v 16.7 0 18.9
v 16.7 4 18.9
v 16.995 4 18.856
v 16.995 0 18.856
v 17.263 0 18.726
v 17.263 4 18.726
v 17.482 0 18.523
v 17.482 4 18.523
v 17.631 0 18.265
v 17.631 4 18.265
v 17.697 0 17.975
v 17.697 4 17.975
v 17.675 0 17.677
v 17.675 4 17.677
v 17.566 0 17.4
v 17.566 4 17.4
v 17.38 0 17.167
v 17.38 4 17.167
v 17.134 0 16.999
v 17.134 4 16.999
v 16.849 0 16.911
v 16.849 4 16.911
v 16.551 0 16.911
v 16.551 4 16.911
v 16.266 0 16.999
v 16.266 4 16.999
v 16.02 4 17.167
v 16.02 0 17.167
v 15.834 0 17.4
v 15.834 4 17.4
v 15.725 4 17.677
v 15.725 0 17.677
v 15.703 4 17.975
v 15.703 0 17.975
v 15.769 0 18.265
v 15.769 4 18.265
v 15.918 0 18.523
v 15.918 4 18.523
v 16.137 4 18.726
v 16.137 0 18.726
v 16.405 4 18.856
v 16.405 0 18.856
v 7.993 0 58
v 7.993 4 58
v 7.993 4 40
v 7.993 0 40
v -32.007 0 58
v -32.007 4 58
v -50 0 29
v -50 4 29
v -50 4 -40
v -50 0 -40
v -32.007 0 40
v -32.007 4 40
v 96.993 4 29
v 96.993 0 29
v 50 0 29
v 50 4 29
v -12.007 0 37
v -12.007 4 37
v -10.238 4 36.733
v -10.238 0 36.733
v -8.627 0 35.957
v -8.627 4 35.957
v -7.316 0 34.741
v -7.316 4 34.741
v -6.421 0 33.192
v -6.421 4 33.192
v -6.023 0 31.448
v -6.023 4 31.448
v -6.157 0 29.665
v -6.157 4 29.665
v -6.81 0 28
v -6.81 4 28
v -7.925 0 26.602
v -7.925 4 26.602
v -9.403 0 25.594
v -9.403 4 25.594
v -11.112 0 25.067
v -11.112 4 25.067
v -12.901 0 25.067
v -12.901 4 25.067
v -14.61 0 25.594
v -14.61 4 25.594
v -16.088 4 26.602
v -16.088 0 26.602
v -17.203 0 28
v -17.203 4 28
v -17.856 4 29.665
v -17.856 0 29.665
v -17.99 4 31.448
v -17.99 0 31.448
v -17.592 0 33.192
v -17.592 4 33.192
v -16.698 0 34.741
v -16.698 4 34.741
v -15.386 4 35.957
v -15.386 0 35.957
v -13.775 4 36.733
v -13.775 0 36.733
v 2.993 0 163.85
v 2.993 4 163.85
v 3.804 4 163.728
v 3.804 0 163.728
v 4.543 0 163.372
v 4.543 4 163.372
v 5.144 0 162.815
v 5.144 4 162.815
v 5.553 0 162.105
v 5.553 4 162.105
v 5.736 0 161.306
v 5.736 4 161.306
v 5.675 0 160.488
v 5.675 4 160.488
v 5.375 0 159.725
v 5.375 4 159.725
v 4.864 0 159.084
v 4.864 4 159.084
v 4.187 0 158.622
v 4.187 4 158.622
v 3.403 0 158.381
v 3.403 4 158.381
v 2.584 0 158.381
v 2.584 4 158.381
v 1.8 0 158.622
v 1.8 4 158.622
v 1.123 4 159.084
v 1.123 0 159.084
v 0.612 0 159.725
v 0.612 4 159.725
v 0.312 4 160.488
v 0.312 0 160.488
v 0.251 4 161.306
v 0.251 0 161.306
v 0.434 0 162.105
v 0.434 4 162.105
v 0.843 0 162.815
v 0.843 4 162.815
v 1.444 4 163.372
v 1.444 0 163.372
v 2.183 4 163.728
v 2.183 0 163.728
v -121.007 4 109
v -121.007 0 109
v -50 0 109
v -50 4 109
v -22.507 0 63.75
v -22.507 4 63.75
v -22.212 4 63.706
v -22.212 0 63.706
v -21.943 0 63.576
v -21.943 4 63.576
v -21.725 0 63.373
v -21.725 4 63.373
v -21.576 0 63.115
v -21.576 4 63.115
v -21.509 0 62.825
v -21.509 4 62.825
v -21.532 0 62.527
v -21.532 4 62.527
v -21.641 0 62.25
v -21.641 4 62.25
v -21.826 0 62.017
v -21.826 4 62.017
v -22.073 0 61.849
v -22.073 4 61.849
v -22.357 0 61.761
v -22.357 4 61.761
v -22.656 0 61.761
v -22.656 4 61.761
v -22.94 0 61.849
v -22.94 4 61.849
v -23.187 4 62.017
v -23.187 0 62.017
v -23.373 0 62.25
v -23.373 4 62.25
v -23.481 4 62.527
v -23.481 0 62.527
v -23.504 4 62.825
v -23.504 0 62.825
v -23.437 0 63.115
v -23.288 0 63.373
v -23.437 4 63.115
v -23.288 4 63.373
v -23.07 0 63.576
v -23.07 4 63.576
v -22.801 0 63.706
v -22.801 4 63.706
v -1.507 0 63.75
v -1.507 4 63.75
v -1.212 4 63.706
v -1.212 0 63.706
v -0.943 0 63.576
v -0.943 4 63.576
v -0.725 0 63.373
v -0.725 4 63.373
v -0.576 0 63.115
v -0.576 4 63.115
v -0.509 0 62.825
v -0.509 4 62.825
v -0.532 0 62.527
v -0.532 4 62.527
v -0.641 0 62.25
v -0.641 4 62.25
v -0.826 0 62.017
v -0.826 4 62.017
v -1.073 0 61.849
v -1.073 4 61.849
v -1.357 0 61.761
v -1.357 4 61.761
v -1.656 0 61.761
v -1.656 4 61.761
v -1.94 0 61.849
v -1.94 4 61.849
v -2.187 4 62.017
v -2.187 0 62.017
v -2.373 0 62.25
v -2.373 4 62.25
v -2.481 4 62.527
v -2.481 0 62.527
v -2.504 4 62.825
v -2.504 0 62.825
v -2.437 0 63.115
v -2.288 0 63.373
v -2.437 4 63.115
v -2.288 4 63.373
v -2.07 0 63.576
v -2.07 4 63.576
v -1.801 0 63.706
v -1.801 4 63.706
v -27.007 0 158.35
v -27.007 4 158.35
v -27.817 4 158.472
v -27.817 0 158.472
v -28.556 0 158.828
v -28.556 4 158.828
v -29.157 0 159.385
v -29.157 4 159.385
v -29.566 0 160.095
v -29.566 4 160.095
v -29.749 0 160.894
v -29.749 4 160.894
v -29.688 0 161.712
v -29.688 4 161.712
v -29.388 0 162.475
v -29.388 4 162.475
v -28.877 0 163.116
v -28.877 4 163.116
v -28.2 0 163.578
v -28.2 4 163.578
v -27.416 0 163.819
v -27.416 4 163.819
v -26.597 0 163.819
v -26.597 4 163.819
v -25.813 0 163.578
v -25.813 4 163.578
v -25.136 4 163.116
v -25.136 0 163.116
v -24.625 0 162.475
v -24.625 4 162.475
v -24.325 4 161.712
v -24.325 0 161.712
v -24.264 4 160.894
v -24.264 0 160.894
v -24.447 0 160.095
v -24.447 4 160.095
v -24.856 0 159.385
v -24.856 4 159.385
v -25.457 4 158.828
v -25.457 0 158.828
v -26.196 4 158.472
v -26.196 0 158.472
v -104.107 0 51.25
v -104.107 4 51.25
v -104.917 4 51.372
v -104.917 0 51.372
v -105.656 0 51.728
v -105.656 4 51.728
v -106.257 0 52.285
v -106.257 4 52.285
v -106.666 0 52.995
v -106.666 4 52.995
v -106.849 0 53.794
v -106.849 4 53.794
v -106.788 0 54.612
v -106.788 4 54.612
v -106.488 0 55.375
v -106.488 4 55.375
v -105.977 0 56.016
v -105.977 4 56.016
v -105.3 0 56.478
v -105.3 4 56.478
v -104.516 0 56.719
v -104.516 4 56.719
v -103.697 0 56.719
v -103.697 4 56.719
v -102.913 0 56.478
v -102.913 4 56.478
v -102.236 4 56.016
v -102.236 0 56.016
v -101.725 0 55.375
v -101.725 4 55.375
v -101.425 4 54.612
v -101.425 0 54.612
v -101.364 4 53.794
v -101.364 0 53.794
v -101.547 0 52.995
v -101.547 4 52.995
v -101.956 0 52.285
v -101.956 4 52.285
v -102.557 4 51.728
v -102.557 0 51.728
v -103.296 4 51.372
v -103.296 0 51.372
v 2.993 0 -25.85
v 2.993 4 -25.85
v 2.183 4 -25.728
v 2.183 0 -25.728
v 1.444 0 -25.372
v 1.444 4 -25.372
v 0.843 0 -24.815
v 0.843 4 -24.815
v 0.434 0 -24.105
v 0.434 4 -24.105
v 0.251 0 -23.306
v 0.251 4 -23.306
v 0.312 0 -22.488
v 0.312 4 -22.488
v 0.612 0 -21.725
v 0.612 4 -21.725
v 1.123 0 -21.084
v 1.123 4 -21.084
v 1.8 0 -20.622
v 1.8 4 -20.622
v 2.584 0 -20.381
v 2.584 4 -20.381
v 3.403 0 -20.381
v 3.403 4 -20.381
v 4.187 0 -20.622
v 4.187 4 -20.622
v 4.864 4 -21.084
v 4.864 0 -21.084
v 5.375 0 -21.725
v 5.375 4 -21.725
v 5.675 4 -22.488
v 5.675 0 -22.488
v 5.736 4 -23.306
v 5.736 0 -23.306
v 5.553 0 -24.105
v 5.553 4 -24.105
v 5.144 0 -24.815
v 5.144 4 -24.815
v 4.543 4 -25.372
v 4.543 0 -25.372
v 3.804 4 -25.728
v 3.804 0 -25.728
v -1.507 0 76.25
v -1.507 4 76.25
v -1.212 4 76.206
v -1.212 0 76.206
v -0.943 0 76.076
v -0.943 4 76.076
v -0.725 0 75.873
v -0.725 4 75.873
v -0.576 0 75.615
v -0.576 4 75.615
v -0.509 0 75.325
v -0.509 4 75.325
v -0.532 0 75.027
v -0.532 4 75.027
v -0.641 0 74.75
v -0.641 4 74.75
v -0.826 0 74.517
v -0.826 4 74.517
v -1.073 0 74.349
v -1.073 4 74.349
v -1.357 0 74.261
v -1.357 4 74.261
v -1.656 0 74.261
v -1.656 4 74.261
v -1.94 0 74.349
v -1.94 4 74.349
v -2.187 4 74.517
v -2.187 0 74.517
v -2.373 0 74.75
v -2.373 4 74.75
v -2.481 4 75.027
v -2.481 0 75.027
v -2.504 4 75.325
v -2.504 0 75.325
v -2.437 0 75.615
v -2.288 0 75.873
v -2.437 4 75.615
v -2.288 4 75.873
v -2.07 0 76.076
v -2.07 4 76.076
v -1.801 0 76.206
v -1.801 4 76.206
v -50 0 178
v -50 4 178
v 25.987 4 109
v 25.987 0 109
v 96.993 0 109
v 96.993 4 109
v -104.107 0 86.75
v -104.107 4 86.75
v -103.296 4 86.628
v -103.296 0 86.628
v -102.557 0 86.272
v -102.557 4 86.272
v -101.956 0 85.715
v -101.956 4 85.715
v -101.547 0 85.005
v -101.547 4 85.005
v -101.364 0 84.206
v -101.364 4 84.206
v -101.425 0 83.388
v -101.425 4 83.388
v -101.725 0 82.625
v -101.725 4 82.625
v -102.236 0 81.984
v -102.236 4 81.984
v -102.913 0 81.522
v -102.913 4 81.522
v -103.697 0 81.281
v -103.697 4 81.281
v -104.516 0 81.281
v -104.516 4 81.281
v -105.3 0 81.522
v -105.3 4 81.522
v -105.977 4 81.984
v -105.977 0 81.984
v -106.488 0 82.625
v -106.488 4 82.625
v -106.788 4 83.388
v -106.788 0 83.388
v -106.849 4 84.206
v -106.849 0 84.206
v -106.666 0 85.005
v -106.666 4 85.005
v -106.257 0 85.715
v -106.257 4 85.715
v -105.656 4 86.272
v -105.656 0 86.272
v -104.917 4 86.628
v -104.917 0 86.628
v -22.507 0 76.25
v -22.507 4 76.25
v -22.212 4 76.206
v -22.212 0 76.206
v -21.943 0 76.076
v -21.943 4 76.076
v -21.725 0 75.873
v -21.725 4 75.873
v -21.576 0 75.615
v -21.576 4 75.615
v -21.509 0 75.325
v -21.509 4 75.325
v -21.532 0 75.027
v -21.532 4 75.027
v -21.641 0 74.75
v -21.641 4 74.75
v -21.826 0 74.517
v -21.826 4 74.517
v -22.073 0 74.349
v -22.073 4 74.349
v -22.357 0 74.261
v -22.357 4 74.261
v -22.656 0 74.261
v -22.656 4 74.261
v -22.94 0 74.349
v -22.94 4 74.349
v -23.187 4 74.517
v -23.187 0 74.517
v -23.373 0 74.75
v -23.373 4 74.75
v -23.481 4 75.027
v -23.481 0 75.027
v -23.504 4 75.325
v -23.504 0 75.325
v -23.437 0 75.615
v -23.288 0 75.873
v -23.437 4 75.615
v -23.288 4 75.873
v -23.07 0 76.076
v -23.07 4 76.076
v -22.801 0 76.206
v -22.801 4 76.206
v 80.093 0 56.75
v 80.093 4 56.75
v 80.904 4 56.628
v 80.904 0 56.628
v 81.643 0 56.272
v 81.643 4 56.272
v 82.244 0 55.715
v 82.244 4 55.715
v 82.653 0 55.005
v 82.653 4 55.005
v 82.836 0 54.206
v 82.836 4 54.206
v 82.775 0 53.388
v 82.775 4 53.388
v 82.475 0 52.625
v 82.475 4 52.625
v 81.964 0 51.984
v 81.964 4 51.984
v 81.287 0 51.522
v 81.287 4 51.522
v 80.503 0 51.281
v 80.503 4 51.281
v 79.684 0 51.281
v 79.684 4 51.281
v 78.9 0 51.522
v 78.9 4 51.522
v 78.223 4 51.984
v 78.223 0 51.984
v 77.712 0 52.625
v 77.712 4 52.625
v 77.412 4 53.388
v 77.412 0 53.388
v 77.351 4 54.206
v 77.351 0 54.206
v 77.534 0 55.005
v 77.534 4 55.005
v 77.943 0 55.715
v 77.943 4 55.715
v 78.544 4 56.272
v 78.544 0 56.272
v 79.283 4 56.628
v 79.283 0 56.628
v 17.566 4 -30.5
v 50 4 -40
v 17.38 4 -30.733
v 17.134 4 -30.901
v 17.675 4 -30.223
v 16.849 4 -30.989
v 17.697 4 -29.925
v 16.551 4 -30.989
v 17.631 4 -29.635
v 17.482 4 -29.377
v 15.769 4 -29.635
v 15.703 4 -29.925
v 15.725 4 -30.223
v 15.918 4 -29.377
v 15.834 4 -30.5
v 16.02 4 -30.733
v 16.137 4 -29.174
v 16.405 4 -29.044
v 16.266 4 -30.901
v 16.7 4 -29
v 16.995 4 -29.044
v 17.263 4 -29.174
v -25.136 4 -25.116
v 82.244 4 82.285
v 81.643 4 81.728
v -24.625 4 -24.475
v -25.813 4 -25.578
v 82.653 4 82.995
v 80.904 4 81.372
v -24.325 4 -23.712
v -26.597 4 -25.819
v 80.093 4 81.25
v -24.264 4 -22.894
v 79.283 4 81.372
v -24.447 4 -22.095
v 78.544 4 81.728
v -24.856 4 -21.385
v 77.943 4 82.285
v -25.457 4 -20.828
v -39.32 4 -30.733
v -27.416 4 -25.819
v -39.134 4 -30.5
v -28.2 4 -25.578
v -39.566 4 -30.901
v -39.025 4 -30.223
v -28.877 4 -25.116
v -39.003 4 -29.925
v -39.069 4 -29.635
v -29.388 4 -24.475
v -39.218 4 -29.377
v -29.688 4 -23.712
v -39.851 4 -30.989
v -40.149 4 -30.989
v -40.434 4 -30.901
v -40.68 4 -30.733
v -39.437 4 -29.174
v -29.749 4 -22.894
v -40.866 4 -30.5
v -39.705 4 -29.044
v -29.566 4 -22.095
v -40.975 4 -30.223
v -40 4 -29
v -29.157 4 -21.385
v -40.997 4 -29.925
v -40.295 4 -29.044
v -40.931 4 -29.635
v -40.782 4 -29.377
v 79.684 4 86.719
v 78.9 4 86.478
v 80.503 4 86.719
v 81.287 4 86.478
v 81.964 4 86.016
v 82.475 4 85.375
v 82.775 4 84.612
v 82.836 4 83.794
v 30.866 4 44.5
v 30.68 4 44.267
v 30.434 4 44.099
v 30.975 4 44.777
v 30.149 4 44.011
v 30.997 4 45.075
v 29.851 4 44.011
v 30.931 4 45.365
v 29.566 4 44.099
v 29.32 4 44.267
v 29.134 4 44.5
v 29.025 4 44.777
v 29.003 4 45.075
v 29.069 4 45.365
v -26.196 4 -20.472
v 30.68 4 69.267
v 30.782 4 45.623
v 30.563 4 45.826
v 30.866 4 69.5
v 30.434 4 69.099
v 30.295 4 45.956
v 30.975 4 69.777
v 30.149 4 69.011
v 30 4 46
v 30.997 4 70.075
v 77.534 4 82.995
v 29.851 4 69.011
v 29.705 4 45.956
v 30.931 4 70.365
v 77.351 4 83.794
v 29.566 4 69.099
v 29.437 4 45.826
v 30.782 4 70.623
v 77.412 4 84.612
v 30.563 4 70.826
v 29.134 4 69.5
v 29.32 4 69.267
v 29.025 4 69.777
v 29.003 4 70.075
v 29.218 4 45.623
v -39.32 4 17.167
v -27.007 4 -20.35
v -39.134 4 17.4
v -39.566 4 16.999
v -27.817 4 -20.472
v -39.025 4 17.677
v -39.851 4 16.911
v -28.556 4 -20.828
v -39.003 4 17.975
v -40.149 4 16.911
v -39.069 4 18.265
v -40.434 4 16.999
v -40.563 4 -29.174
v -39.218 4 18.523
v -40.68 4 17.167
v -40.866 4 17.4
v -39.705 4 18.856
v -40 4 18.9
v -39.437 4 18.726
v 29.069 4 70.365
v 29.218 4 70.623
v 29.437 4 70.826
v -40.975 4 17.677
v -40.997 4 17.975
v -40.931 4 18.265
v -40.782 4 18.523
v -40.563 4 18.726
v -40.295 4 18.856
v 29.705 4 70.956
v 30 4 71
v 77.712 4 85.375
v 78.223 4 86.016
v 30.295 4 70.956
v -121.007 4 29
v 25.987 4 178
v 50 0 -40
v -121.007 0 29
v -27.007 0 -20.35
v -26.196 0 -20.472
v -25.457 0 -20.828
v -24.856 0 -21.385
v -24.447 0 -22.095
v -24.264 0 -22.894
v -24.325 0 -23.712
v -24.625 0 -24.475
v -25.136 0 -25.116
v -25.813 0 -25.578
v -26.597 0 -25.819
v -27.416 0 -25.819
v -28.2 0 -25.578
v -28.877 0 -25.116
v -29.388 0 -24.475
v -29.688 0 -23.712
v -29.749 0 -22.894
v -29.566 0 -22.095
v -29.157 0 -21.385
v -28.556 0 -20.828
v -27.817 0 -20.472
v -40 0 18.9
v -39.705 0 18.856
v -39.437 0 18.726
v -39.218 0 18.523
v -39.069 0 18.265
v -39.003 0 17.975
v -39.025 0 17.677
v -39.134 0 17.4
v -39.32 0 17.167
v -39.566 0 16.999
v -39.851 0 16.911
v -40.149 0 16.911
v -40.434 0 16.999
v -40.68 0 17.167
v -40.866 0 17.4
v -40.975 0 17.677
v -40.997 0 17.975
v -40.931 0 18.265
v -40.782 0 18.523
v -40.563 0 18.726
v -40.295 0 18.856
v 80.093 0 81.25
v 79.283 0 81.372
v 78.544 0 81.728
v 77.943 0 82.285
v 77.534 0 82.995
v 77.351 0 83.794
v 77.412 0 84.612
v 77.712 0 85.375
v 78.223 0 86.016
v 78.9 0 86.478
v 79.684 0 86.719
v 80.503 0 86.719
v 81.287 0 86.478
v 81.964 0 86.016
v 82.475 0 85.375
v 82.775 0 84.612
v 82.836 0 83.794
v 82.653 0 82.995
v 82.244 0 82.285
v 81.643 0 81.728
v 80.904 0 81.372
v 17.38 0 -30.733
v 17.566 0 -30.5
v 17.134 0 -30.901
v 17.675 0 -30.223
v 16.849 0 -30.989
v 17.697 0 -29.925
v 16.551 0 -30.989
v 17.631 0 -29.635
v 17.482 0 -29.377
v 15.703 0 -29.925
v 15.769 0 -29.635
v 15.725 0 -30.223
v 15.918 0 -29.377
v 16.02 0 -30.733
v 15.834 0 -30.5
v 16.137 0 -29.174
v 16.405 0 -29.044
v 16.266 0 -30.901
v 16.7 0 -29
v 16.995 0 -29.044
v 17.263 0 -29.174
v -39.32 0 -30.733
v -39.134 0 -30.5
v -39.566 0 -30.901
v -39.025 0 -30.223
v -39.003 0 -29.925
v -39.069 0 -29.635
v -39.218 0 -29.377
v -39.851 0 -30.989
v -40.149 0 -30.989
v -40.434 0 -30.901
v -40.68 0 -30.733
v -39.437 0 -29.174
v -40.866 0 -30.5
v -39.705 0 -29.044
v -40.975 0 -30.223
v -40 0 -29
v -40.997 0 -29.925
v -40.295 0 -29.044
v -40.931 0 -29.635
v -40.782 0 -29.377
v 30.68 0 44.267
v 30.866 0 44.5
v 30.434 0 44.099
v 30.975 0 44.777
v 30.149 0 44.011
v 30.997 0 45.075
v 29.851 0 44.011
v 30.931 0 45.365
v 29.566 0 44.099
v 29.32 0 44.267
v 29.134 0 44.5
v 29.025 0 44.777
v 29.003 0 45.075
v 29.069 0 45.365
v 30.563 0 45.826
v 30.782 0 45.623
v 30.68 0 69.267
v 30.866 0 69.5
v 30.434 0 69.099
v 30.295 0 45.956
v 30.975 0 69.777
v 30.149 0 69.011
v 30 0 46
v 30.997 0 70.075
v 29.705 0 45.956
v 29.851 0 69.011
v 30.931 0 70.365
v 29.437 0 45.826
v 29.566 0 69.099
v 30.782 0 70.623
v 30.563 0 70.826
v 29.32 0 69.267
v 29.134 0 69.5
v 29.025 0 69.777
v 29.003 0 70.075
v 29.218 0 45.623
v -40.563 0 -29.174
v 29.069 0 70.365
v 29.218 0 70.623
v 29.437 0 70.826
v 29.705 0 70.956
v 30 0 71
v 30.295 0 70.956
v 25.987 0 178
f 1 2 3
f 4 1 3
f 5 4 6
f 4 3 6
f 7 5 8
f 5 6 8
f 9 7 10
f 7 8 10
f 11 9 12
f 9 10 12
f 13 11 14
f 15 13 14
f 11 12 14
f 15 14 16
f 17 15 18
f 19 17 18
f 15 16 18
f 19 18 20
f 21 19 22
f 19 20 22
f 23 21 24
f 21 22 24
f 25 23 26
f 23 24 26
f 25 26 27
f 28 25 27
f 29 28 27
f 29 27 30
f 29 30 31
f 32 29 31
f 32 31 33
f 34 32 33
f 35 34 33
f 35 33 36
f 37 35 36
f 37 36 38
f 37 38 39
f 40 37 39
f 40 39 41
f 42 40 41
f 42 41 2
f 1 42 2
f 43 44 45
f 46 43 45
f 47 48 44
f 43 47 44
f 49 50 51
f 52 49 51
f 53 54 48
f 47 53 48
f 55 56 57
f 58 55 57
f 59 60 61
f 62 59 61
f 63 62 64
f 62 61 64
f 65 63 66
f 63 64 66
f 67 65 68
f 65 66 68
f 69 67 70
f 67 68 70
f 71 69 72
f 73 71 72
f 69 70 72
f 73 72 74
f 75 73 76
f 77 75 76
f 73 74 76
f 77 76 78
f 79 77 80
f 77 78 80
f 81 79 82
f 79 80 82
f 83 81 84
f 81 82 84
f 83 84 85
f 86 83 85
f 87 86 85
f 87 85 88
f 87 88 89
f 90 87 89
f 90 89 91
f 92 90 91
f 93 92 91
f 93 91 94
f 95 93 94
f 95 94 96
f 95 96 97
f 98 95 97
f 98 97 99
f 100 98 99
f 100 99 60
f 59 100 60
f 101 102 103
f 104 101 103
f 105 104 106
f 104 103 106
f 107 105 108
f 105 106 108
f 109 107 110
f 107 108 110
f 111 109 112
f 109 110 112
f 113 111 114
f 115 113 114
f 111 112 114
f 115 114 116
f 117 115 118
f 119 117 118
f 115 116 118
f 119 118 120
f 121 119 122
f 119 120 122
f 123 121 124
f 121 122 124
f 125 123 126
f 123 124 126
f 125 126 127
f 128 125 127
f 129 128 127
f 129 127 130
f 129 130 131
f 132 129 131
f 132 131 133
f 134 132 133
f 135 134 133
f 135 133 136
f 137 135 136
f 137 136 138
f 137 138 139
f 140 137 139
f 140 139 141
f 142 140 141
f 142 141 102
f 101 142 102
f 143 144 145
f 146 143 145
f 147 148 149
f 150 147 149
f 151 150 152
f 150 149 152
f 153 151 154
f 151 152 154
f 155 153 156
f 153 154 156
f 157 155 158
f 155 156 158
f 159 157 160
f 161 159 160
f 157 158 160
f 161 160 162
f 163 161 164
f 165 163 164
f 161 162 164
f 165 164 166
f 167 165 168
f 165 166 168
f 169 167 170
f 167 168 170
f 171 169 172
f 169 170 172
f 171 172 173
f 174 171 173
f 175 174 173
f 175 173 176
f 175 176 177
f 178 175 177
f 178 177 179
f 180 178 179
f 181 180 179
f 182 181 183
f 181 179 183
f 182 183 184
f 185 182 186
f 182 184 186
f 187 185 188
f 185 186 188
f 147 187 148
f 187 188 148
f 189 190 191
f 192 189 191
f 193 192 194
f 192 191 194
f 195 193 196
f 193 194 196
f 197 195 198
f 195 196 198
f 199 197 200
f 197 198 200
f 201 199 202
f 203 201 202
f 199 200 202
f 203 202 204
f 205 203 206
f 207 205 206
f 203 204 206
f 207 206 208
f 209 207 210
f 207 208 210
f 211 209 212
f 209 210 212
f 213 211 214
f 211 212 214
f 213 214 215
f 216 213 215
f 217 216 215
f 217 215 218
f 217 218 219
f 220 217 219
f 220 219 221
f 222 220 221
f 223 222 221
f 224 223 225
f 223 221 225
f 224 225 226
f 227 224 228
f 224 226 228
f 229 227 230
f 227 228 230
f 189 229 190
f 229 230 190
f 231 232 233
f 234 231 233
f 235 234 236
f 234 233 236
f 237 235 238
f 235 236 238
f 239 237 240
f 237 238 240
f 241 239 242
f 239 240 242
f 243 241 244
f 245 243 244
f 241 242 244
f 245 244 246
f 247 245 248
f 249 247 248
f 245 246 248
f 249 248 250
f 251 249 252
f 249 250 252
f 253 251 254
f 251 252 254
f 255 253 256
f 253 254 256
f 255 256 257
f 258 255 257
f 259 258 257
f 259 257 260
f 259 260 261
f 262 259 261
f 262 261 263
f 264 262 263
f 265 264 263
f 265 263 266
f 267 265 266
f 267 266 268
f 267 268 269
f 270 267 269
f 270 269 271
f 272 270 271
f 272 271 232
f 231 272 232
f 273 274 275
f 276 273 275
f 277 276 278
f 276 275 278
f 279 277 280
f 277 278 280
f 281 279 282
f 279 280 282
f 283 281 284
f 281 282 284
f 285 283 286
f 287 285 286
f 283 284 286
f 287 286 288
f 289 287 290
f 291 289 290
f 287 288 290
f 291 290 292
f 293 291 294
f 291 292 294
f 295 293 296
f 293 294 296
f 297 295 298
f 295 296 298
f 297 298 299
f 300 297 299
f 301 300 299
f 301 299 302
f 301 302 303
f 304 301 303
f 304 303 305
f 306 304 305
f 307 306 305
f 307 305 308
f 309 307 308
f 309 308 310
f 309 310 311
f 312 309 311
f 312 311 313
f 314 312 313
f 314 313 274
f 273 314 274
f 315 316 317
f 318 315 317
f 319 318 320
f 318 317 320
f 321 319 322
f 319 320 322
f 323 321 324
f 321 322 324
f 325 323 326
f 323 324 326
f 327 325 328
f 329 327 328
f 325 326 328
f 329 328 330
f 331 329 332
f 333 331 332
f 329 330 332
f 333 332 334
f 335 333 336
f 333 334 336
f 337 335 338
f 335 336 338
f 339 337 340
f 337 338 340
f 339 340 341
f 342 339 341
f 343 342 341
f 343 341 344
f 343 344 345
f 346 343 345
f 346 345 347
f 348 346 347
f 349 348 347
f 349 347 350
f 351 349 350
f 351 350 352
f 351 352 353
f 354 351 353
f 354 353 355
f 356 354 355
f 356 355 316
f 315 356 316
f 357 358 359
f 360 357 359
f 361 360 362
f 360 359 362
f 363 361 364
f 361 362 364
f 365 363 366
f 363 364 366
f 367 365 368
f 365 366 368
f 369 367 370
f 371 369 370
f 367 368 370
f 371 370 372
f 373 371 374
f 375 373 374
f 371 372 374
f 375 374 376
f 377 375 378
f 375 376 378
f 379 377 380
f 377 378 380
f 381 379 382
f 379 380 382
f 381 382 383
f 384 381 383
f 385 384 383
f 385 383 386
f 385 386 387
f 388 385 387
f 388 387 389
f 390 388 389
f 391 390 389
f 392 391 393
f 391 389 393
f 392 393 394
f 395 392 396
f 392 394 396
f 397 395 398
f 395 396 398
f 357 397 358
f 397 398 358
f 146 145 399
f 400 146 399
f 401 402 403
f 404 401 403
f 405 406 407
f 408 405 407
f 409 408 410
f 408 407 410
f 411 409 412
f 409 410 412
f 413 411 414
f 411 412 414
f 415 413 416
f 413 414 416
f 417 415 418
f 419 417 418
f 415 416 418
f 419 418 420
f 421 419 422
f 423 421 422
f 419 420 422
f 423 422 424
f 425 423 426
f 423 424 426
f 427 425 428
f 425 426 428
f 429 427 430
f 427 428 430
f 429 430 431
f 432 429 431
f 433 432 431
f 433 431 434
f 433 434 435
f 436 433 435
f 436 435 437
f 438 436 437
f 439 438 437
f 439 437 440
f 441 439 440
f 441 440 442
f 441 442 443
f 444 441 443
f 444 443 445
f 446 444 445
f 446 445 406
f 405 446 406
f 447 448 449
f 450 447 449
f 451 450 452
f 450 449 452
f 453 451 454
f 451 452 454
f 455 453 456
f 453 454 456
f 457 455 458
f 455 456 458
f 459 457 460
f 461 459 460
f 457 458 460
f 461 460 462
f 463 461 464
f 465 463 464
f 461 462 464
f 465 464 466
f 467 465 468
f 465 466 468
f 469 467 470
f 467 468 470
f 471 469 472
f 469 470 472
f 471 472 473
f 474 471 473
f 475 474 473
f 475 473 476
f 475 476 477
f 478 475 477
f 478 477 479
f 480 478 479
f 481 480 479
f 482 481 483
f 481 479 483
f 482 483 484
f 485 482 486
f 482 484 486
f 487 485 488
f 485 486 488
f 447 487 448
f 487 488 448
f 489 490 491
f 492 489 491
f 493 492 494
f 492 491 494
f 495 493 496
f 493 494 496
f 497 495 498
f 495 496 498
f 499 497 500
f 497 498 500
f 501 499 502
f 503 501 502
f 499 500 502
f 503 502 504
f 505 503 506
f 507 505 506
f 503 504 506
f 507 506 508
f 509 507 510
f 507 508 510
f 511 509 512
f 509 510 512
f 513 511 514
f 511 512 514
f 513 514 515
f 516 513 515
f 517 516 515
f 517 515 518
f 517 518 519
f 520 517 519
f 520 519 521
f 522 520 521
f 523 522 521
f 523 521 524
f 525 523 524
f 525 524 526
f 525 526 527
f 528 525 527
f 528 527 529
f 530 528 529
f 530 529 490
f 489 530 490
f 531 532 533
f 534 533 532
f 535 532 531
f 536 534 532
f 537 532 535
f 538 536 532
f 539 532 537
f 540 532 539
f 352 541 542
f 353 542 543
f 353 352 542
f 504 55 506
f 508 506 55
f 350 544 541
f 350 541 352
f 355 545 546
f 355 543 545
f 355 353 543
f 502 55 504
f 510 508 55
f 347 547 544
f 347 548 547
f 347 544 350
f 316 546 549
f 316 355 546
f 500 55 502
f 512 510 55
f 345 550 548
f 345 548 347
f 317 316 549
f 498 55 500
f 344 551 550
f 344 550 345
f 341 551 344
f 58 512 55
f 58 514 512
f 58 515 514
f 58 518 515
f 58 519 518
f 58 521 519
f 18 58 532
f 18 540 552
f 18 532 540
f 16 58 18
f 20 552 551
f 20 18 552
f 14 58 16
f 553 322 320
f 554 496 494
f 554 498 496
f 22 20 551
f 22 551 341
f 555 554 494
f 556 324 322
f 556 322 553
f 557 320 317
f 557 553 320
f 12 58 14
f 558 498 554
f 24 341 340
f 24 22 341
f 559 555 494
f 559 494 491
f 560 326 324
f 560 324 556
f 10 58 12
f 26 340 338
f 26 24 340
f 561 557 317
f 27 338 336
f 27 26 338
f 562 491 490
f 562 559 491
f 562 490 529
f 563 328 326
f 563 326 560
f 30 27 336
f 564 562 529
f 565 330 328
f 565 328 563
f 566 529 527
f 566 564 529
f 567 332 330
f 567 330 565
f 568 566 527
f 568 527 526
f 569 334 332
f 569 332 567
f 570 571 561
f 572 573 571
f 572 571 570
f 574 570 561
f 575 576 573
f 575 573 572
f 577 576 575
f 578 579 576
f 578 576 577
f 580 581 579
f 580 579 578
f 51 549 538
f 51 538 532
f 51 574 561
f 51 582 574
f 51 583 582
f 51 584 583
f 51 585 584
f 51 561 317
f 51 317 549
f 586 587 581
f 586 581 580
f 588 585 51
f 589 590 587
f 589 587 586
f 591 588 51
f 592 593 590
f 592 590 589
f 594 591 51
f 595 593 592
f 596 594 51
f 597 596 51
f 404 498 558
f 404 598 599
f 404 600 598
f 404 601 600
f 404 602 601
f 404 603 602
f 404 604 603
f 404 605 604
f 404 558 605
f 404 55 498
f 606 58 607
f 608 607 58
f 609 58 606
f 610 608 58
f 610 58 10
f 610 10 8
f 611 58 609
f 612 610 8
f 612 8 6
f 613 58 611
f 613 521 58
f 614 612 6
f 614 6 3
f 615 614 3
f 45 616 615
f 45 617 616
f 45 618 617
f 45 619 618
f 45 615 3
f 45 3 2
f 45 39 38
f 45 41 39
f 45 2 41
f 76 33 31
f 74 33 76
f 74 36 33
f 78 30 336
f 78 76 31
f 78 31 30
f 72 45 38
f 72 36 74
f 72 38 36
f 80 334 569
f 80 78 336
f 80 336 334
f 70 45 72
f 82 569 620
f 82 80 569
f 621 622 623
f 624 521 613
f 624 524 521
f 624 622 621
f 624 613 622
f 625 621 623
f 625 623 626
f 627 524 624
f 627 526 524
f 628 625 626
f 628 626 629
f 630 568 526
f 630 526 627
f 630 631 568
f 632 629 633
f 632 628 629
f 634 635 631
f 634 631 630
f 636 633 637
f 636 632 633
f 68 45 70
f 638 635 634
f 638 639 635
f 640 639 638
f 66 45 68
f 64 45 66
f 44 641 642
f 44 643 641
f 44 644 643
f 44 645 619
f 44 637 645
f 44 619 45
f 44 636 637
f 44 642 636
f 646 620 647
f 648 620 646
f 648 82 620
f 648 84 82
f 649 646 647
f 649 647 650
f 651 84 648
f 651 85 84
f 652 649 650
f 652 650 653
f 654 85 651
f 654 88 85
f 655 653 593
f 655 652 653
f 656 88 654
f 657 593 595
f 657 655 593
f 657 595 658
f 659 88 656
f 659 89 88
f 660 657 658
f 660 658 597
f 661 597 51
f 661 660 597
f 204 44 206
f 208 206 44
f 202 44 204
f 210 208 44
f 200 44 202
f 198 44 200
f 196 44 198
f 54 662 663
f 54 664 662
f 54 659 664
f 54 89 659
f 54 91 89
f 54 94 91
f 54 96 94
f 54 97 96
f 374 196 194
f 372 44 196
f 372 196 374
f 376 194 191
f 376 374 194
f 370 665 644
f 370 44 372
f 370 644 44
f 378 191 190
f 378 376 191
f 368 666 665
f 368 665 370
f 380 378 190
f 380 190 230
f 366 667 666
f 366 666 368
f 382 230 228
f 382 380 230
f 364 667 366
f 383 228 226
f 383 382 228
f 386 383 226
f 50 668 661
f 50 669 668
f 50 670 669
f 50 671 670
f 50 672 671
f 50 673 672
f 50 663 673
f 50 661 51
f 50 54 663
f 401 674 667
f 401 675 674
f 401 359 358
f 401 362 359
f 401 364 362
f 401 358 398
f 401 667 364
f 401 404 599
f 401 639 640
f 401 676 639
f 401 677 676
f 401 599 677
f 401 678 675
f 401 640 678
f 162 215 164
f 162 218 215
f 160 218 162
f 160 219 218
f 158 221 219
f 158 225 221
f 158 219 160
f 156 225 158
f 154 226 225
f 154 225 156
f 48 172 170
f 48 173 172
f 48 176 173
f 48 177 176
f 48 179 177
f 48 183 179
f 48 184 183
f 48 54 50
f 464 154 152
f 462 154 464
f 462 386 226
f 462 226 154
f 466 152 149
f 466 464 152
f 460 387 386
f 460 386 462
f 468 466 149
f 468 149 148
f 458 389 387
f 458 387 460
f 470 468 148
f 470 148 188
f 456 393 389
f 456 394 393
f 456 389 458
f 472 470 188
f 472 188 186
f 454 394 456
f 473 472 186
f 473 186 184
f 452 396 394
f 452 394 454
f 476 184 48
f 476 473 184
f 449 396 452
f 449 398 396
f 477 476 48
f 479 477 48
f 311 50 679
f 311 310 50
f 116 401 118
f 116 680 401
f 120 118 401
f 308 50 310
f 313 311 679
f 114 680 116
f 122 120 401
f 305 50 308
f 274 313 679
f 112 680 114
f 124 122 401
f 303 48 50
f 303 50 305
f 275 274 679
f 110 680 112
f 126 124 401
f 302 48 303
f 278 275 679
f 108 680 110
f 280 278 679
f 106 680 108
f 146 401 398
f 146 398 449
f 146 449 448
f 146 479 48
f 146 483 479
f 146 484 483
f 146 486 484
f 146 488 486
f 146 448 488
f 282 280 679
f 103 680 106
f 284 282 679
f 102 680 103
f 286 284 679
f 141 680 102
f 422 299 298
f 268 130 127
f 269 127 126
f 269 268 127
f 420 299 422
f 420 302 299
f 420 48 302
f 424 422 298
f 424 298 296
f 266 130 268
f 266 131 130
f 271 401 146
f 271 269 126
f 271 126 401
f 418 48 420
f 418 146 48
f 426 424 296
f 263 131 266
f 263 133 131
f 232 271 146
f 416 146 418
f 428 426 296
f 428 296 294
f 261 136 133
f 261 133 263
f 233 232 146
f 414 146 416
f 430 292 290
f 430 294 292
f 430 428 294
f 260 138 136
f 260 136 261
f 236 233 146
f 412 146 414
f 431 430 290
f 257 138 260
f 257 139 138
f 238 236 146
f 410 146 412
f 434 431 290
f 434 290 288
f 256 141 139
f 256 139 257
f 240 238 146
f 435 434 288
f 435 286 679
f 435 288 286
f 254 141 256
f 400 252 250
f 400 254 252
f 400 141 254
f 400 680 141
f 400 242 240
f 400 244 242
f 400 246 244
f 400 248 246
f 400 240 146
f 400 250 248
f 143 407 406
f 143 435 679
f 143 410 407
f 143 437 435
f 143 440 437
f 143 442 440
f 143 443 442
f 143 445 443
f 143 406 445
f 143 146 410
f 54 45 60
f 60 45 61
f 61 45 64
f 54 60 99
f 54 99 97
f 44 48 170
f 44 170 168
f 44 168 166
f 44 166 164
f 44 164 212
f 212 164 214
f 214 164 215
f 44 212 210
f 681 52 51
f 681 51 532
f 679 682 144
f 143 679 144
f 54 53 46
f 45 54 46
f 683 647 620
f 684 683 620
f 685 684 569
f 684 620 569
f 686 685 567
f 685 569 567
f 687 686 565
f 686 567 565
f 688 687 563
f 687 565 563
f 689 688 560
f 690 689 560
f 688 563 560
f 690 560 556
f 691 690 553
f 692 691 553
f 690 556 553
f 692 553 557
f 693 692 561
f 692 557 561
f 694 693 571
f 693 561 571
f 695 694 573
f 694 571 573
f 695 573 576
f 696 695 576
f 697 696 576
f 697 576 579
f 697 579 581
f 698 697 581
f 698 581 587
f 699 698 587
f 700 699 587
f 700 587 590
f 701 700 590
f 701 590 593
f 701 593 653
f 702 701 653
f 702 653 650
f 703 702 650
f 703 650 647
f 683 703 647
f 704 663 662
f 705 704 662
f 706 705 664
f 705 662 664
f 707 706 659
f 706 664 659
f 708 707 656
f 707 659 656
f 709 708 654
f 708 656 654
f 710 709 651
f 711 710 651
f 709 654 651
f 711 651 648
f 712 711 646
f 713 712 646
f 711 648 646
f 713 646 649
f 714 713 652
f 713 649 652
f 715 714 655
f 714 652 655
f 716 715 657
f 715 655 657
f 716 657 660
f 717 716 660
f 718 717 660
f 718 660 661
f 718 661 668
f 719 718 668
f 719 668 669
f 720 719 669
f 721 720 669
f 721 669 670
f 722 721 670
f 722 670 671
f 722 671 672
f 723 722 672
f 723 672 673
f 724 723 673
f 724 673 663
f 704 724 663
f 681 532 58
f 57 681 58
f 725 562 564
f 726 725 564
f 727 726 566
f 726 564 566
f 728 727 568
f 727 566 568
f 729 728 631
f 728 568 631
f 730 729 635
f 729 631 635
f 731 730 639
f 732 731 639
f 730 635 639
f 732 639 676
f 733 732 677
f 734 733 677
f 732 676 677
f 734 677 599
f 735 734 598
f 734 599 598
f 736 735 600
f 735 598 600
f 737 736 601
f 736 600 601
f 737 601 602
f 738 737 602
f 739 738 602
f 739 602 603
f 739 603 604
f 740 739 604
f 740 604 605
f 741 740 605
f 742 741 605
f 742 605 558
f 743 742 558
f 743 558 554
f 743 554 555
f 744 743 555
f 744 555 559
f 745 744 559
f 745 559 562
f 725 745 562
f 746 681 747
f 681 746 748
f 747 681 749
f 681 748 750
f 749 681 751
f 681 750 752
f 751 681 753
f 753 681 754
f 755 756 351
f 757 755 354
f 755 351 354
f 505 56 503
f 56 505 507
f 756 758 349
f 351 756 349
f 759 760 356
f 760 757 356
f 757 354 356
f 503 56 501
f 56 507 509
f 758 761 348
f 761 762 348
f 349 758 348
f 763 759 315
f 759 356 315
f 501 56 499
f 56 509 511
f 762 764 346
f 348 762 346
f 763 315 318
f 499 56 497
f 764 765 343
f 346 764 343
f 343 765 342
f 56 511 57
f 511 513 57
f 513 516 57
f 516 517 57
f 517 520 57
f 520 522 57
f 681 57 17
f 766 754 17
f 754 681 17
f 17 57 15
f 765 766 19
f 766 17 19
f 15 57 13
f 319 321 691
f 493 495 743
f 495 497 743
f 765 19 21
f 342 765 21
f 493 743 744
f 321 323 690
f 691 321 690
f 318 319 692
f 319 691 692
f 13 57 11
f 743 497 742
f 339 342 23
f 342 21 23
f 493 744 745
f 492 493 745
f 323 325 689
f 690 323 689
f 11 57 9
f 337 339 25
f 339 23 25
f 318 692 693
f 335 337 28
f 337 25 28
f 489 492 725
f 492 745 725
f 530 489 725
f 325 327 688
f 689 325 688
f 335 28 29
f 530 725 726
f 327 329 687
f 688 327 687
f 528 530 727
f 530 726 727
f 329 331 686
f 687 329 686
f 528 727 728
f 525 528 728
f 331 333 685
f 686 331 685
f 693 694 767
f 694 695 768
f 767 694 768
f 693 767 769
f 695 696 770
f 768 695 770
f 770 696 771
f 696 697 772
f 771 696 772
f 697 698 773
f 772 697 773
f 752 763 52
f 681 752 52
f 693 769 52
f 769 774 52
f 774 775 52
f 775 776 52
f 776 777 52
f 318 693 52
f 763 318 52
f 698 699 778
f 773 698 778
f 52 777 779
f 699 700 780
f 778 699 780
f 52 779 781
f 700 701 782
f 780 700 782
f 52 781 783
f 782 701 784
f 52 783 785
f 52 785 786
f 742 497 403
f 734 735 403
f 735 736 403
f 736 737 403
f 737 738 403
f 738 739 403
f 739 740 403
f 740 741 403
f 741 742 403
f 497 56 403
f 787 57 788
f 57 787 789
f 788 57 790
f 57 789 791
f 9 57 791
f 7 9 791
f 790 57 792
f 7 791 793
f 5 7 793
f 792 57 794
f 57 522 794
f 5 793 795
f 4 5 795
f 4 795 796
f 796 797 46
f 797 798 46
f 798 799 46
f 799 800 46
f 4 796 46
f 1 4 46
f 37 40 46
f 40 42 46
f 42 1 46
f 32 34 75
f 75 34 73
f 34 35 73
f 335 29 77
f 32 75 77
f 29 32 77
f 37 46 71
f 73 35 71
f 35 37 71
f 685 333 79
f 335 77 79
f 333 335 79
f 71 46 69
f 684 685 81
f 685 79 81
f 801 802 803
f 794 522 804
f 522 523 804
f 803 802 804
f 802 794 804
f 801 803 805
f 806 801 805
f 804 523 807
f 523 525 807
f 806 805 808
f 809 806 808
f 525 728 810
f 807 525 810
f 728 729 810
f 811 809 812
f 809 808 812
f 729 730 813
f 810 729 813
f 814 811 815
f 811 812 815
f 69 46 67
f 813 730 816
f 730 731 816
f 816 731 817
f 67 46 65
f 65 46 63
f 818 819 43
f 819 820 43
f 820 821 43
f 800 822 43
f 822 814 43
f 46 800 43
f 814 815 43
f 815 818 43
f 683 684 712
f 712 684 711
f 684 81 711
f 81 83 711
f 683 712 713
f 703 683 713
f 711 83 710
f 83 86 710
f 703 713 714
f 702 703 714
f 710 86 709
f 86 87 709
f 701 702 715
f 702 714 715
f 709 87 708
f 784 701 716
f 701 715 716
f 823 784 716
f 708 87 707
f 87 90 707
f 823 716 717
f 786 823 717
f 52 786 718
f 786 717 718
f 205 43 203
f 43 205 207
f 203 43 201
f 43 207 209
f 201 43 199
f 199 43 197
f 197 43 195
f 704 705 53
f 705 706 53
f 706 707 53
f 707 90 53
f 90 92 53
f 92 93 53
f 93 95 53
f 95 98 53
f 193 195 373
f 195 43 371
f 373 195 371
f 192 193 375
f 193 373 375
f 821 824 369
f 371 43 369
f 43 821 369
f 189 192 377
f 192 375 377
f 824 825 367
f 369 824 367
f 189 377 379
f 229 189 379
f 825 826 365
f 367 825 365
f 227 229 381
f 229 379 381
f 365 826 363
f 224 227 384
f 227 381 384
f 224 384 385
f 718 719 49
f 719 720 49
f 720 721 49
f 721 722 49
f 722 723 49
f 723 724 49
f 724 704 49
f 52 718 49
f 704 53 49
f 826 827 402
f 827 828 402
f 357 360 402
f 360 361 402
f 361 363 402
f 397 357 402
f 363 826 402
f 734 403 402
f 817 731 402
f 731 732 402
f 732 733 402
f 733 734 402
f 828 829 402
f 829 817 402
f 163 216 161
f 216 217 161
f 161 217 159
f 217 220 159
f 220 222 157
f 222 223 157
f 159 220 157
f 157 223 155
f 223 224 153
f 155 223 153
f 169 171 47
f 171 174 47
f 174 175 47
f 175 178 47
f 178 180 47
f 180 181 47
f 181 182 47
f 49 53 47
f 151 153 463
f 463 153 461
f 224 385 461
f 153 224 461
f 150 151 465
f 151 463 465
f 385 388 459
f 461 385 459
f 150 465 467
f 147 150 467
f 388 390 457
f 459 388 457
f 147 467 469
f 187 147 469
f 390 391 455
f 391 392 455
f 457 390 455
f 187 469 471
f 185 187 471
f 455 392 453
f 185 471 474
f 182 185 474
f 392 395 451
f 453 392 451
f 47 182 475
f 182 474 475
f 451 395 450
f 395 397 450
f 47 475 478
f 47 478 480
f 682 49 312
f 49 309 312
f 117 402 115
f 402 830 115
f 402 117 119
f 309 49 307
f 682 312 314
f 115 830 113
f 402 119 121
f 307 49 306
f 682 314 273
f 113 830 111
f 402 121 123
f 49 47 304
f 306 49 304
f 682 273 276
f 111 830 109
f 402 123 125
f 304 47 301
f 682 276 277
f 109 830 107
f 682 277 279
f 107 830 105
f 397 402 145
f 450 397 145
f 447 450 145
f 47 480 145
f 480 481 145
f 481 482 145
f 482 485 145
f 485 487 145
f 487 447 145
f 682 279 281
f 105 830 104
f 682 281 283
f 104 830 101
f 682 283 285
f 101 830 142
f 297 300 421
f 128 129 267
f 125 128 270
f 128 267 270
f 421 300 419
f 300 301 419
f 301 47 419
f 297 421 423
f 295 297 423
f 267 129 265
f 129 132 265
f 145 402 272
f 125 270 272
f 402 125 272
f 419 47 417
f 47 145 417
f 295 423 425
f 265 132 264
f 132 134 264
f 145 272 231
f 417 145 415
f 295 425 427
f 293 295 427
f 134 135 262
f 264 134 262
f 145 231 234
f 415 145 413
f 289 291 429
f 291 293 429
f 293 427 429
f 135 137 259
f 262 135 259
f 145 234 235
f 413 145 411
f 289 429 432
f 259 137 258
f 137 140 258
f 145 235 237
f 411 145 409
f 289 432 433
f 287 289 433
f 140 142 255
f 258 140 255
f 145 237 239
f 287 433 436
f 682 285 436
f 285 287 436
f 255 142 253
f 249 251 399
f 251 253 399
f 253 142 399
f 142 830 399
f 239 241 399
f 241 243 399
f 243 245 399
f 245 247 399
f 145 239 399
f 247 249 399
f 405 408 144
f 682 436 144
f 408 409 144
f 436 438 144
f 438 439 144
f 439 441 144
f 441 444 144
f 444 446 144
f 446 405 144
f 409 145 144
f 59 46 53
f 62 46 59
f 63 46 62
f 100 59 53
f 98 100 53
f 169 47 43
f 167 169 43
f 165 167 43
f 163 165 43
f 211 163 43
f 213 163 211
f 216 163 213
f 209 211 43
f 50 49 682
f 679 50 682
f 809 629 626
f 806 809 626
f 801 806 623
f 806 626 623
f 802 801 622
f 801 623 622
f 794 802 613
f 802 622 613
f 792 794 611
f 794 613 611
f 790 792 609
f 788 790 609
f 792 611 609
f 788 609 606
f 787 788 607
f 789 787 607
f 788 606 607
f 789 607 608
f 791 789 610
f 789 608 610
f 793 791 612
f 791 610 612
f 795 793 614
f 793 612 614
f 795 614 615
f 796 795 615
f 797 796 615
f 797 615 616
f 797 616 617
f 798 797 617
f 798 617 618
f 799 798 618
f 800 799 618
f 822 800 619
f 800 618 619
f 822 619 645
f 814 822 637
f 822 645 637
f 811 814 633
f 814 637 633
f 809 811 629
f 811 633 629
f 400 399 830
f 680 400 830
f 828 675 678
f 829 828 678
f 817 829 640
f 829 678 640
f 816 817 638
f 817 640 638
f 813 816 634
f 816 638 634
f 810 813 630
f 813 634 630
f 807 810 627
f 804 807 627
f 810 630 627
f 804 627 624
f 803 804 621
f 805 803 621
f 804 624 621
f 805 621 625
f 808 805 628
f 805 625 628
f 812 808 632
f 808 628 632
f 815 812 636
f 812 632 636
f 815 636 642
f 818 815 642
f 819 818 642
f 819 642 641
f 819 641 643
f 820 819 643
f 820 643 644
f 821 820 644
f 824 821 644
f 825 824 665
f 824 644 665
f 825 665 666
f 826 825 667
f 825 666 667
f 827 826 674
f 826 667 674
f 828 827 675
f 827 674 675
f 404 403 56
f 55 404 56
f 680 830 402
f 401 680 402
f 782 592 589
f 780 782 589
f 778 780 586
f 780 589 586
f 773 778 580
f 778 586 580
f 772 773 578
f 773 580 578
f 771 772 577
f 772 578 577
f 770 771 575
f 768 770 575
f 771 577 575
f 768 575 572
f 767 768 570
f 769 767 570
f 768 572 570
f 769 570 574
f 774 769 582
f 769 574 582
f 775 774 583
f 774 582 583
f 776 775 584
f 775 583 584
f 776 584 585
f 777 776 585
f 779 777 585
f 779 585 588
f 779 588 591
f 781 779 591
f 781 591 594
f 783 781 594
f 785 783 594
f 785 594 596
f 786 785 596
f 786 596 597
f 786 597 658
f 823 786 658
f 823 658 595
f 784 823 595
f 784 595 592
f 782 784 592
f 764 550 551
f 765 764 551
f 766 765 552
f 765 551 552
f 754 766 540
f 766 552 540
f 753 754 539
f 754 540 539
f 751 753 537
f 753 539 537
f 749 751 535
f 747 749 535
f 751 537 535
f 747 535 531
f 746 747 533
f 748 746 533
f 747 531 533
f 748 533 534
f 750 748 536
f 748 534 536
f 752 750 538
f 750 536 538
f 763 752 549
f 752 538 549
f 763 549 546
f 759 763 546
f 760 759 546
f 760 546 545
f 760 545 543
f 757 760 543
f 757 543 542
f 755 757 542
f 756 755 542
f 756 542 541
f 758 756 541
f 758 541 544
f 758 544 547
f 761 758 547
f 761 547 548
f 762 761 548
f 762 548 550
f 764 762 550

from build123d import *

# Parameters (mm, degrees)
SKETCH1_W           = 100
SKETCH1_H           = 80
BOSS_EXTRUDE1_DEPTH = 4
SKETCH2_R           = 1
CUT_EXTRUDE1_DEPTH  = 65.156059729
BOSS_EXTRUDE2_DEPTH = 4
SKETCH4_R           = 1
CUT_EXTRUDE2_DEPTH  = 4
SKETCH5_R           = 1
CUT_EXTRUDE3_DEPTH  = 4
SKETCH6_R           = 6
CUT_EXTRUDE4_DEPTH  = 95.424573073
BOSS_EXTRUDE3_DEPTH = 4
SKETCH8_R           = 2.75
CUT_EXTRUDE5_DEPTH  = 216.273272068


with BuildPart() as part:
    # Sketch1 → Boss-Extrude1 (new body)
    with BuildSketch(Plane(origin=(0, 0, 0), x_dir=(1, 0, 0), z_dir=(0, 1, 0))):
        Rectangle(SKETCH1_W, SKETCH1_H)
    extrude(amount=BOSS_EXTRUDE1_DEPTH)

    # Sketch2 → Cut-Extrude1 (cut, through all)
    with BuildSketch(Plane(origin=(0, 4, 0), x_dir=(1, 0, 0), z_dir=(0, 1, 0))):
        with Locations(Location((-40, 30, 0), (0, 0, 270))):
            Circle(SKETCH2_R)
        with Locations(Location((16.7, 30, 0), (0, 0, 270))):
            Circle(SKETCH2_R)
        with Locations(Location((16.7, -17.9, 0), (0, 0, 270))):
            Circle(SKETCH2_R)
        with Locations(Location((-40, -17.9, 0), (0, 0, 270))):
            Circle(SKETCH2_R)
    extrude(amount=-CUT_EXTRUDE1_DEPTH, mode=Mode.SUBTRACT)

    # Sketch3 → Boss-Extrude2 (add)
    with BuildSketch(Plane(origin=(0, 4, 0), x_dir=(1, 0, 0), z_dir=(0, 1, 0))):
        Polygon((7.993464363, -40), (50, -40), (50, -80), (-50, -80), (-50, -40), (-32.006535637, -40), (-32.006535637, -58), (7.993464363, -58), align=None)
    extrude(amount=-BOSS_EXTRUDE2_DEPTH)

    # Sketch4 → Cut-Extrude2 (cut)
    with BuildSketch(Plane(origin=(0, 4, 0), x_dir=(1, 0, 0), z_dir=(0, 1, 0))):
        with Locations(Location((-22.506535637, -62.75, 0), (0, 0, 270))):
            Circle(SKETCH4_R)
        with Locations(Location((-22.506535637, -75.25, 0), (0, 0, 270))):
            Circle(SKETCH4_R)
        with Locations(Location((-1.506535637, -75.25, 0), (0, 0, 270))):
            Circle(SKETCH4_R)
        with Locations(Location((-1.506535637, -62.75, 0), (0, 0, 270))):
            Circle(SKETCH4_R)
    extrude(amount=-CUT_EXTRUDE2_DEPTH, mode=Mode.SUBTRACT)

    # Sketch5 → Cut-Extrude3 (cut)
    with BuildSketch(Plane(origin=(0, 4, 0), x_dir=(1, 0, 0), z_dir=(0, 1, 0))):
        with Locations(Location((30, -45, 0), (0, 0, 270))):
            Circle(SKETCH5_R)
        with Locations(Location((30, -70, 0), (0, 0, 270))):
            Circle(SKETCH5_R)
    extrude(amount=-CUT_EXTRUDE3_DEPTH, mode=Mode.SUBTRACT)

    # Sketch6 → Cut-Extrude4 (cut, through all)
    with BuildSketch(Plane(origin=(0, 4, 0), x_dir=(1, 0, 0), z_dir=(0, 1, 0))):
        with Locations(Location((-12.006535637, -31, 0), (0, 0, 270))):
            Circle(SKETCH6_R)
    extrude(amount=-CUT_EXTRUDE4_DEPTH, mode=Mode.SUBTRACT)

    # Sketch7 → Boss-Extrude3 (add)
    with BuildSketch(Plane.XZ):
        Polygon((96.993464363, 29), (50, 29), (50, 80), (-50, 80), (-50, 29), (-121.006535637, 29), (-121.006535637, 109), (-50, 109), (-50, 178), (25.986928727, 178), (25.986928727, 109), (96.993464363, 109), align=None)
    extrude(amount=-BOSS_EXTRUDE3_DEPTH)

    # Sketch8 → Cut-Extrude5 (cut, through all)
    with BuildSketch(Plane(origin=(0, 4, 0), x_dir=(1, 0, 0), z_dir=(0, 1, 0))):
        with Locations(Location((-104.106535637, -84, 0), (0, 0, 270))):
            Circle(SKETCH8_R)
        with Locations(Location((-104.106535637, -54, 0), (0, 0, 90))):
            Circle(SKETCH8_R)
        with Locations(Location((80.093464363, -54, 0), (0, 0, 270))):
            Circle(SKETCH8_R)
        with Locations(Location((80.093464363, -84, 0), (0, 0, 90))):
            Circle(SKETCH8_R)
        with Locations(Location((-27.006535637, 23.1, 0), (0, 0, 270))):
            Circle(SKETCH8_R)
        with Locations(Location((2.993464363, 23.1, 0), (0, 0, 90))):
            Circle(SKETCH8_R)
        with Locations(Location((2.993464363, -161.1, 0), (0, 0, 270))):
            Circle(SKETCH8_R)
        with Locations(Location((-27.006535637, -161.1, 0), (0, 0, 90))):
            Circle(SKETCH8_R)
    extrude(amount=-CUT_EXTRUDE5_DEPTH, mode=Mode.SUBTRACT)


solid = part.part
